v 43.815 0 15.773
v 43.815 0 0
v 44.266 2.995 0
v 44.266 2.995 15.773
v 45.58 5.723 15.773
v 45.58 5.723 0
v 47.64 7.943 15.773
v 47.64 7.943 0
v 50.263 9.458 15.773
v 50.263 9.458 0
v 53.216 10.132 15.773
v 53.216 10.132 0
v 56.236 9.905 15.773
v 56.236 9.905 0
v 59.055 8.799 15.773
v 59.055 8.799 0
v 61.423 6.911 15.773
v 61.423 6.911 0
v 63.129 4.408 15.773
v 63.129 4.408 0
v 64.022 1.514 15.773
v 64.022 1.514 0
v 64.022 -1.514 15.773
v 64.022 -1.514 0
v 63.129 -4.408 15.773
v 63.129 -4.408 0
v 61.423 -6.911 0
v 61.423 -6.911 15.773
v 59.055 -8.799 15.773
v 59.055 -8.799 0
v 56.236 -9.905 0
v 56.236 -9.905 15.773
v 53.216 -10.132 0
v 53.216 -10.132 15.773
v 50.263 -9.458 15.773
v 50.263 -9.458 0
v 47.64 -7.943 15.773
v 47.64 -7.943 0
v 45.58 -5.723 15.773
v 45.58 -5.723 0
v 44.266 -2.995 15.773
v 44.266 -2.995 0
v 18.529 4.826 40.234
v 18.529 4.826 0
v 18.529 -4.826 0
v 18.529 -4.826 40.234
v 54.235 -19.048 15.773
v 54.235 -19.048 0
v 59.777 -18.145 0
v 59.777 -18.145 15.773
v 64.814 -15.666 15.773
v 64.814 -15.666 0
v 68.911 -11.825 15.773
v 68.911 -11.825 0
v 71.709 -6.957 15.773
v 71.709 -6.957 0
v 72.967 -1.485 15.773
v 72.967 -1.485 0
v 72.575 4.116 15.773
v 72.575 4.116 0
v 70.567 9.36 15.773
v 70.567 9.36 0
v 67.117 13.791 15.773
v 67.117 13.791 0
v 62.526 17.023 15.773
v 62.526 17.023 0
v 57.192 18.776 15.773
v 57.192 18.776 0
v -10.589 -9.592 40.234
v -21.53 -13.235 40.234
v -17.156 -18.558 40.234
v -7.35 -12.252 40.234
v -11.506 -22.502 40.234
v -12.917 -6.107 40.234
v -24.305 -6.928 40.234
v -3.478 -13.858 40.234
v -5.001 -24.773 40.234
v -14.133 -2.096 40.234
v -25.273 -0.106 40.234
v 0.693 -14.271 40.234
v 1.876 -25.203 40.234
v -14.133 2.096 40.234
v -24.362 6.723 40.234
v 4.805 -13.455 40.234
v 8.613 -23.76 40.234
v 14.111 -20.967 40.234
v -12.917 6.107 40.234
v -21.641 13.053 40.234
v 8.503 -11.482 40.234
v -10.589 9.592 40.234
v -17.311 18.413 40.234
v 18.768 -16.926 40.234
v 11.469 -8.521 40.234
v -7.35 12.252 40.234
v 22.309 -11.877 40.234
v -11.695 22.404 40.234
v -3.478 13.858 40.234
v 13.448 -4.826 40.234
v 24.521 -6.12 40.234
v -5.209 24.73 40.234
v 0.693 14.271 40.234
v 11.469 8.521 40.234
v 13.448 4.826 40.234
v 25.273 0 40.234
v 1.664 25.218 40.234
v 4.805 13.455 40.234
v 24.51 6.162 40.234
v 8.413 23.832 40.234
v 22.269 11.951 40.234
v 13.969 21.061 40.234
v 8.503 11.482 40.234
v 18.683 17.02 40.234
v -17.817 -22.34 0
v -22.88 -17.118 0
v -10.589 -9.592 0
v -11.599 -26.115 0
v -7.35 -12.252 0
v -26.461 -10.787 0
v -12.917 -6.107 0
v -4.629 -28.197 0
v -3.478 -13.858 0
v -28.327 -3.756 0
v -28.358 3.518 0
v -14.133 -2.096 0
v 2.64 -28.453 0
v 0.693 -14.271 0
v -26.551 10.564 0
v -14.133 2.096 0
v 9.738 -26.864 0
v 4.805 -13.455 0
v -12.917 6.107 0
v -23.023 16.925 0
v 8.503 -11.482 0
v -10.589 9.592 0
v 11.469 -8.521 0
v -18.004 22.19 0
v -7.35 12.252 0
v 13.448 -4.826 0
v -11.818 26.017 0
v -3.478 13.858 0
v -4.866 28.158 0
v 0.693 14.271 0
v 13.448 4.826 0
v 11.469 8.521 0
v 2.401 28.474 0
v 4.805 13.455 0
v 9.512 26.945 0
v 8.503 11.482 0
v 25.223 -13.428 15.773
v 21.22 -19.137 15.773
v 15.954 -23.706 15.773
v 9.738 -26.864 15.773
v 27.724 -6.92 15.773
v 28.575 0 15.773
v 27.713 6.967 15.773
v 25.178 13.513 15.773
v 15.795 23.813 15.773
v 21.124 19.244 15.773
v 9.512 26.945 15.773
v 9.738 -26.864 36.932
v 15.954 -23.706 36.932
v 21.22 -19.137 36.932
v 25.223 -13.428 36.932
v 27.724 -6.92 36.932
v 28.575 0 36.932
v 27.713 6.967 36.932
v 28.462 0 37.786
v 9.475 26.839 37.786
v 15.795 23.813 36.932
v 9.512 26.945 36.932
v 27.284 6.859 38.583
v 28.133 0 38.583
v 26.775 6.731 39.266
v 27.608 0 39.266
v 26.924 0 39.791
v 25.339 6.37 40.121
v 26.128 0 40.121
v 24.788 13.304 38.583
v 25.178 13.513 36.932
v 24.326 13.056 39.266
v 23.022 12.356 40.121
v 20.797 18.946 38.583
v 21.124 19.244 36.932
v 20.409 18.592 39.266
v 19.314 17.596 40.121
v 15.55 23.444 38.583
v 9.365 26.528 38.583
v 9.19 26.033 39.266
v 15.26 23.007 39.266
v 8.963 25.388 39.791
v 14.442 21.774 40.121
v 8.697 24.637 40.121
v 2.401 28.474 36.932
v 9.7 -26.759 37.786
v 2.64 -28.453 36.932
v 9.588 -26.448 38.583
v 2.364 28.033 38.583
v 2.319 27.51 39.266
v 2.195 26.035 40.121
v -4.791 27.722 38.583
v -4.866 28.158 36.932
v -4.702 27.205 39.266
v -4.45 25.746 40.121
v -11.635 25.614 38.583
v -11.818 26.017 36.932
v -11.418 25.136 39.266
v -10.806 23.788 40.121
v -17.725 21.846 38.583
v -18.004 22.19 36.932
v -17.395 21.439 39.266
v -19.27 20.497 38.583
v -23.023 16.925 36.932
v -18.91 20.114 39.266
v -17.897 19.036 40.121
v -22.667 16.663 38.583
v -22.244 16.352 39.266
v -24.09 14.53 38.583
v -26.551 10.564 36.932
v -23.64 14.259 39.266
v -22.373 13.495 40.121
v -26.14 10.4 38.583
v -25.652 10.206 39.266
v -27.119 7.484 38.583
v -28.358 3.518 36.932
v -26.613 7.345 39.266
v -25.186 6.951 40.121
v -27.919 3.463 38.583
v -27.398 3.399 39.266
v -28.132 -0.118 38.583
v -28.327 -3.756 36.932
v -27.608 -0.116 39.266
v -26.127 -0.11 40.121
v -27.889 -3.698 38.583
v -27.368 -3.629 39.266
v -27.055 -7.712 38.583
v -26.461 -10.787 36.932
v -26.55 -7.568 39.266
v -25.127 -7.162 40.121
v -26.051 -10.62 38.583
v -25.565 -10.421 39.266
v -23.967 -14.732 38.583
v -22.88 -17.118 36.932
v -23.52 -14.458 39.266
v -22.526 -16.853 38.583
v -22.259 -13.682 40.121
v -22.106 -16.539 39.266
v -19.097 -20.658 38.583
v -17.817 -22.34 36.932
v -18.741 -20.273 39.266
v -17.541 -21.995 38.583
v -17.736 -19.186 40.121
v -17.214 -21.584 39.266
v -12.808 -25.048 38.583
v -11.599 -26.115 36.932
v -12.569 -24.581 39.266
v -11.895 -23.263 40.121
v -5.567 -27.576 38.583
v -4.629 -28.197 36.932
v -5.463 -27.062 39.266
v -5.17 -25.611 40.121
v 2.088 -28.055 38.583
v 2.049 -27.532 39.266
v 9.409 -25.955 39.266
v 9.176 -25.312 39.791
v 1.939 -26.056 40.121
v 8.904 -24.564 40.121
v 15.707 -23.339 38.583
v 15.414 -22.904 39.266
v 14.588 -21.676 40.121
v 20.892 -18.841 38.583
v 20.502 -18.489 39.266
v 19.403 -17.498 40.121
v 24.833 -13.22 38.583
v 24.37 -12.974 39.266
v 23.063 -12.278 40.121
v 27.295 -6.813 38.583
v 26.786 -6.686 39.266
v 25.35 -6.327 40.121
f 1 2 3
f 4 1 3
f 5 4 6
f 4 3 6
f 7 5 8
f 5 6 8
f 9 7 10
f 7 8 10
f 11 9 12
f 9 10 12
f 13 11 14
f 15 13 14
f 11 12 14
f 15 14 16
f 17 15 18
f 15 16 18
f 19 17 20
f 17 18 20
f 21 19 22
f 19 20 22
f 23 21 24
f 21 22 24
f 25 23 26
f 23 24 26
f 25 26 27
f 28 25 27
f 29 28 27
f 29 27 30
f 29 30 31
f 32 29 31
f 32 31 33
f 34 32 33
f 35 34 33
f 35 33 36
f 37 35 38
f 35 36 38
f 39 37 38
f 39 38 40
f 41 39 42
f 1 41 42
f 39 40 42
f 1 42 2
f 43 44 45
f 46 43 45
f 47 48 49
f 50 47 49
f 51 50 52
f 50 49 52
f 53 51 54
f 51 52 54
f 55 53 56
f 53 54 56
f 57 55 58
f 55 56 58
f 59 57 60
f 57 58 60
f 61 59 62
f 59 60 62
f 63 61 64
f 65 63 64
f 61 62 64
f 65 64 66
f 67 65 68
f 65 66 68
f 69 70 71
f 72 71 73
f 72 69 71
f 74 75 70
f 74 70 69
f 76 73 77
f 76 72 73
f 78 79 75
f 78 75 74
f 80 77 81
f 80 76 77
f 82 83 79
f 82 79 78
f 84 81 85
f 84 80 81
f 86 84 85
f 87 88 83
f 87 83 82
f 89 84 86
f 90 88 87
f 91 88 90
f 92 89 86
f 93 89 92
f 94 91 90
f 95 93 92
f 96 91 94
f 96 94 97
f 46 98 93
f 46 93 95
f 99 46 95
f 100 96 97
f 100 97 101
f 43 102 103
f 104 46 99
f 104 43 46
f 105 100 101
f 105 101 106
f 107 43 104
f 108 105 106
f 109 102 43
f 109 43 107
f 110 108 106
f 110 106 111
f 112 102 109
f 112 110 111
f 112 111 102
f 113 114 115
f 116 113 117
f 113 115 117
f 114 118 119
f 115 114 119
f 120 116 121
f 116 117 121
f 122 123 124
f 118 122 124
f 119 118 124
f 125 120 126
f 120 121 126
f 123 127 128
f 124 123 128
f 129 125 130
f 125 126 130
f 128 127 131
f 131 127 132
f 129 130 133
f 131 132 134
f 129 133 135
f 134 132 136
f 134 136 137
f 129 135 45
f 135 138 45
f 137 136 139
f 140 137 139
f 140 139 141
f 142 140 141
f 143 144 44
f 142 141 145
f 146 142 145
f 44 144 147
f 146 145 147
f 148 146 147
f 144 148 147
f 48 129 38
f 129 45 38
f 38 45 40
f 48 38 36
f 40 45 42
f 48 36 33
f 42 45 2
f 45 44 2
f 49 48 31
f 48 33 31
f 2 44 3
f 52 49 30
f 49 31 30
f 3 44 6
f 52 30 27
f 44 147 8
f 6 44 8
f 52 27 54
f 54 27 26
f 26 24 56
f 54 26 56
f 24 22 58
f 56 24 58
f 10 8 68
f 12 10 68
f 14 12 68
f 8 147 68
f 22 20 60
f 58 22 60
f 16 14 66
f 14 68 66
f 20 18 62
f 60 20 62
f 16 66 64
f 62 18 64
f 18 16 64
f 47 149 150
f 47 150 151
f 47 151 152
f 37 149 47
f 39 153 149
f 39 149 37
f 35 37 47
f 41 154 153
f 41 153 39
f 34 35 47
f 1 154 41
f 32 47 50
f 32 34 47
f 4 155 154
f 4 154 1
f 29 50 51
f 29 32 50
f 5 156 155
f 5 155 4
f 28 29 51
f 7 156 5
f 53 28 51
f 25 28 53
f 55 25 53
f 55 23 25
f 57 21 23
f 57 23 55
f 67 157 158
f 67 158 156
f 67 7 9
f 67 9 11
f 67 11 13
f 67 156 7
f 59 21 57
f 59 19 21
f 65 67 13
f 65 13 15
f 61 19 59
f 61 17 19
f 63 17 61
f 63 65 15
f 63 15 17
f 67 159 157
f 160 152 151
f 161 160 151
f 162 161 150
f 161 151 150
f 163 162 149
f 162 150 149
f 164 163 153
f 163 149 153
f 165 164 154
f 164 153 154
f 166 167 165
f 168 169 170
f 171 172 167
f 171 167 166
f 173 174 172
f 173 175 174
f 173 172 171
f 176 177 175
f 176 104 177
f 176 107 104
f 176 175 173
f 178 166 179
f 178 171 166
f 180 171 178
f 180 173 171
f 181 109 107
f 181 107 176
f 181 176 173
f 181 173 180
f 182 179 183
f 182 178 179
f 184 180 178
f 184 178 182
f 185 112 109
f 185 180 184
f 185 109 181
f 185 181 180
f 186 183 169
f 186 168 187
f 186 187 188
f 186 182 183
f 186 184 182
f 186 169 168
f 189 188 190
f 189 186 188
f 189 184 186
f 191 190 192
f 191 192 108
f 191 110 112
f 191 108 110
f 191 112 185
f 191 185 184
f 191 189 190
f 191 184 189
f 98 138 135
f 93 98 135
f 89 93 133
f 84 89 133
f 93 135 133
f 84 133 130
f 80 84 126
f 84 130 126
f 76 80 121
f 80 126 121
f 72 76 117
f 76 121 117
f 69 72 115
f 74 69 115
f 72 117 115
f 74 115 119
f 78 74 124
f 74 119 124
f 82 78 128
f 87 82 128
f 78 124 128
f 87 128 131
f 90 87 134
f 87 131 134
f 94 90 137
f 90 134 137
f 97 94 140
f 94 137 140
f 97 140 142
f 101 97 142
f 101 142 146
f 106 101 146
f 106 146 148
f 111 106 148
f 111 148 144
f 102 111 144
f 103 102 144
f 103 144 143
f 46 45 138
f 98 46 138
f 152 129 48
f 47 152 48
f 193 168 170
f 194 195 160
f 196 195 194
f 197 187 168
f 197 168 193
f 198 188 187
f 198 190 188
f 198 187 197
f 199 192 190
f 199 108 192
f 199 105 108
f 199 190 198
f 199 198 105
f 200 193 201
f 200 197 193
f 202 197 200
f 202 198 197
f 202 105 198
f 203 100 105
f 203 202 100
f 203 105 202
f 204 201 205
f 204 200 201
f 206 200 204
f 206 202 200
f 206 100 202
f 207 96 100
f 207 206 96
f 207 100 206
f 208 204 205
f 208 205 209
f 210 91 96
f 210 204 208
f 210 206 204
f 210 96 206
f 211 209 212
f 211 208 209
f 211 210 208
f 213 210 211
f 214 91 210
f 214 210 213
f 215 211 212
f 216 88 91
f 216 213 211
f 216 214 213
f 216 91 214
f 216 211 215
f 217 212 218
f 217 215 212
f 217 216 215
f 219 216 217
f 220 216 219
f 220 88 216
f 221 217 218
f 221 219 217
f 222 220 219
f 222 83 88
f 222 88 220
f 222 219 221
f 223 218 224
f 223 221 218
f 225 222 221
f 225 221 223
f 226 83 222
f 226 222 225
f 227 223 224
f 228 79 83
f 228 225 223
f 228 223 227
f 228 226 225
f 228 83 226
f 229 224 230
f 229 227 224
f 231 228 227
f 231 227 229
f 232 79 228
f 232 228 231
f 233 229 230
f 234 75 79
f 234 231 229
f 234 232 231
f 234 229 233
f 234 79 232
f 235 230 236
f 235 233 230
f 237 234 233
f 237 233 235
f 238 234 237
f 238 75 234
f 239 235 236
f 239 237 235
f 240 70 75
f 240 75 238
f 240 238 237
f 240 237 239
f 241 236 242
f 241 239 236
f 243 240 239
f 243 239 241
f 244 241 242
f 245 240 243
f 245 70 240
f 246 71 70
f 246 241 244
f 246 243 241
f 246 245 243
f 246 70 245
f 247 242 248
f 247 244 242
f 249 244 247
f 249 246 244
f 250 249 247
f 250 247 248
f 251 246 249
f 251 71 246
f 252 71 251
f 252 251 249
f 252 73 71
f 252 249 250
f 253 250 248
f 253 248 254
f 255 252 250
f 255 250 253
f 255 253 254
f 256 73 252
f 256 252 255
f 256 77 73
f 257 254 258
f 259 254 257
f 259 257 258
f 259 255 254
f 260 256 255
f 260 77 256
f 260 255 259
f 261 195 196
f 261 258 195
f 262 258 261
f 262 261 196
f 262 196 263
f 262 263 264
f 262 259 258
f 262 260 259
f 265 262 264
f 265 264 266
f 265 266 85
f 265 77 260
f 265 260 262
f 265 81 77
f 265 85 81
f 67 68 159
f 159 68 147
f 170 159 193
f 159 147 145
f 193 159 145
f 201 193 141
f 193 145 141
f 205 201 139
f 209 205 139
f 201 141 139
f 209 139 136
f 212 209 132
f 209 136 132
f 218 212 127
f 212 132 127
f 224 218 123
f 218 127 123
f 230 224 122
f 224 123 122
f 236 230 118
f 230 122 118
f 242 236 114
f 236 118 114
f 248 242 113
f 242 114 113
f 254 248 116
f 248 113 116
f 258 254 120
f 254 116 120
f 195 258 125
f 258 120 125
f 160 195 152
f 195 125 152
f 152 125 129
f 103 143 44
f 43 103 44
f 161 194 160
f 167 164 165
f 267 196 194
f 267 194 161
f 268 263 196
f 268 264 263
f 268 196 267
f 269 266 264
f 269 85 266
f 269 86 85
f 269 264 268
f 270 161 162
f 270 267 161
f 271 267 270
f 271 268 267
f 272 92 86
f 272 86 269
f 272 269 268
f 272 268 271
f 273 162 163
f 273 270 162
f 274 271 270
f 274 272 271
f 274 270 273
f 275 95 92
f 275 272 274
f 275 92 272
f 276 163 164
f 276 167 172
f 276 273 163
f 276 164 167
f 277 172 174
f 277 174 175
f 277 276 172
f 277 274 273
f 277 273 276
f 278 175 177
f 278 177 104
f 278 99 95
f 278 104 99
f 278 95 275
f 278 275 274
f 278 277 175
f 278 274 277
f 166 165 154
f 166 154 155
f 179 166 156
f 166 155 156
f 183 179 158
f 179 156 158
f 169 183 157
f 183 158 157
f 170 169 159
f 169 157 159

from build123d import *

# Parameters (mm, degrees)
F1_DEPTH = 40.2336
F2_DEPTH = 15.7734
F3_R     = 3.302


with BuildPart() as f1:
    # F0 (on Top) → F1 (new body)
    with BuildSketch(Plane.XY):
        with BuildLine():
            ThreePointArc((9.738373, -26.864376), (23.39663, -16.405131), (28.575, 0))
            ThreePointArc((28.575, 0), (23.327466, 16.503332), (9.512184, 26.945296))
            ThreePointArc((9.512184, 26.945296), (-28.574748, -0.120114), (9.738373, -26.864376))
        make_face()
        with BuildLine():
            Line((18.5293, 4.826), (18.5293, 0))
            Line((18.5293, 0), (18.5293, -4.826))
            Line((18.5293, -4.826), (13.447765, -4.826))
            ThreePointArc((13.447765, -4.826), (-14.2875, 0), (13.447765, 4.826))
            Line((13.447765, 4.826), (18.5293, 4.826))
        make_face(mode=Mode.SUBTRACT)
    extrude(amount=F1_DEPTH)

    # F0 (on Top) → F2 (join)
    with BuildSketch(Plane.XY):
        with BuildLine():
            ThreePointArc((9.512184, 26.945296), (23.327466, 16.503332), (28.575, 0))
            ThreePointArc((28.575, 0), (23.39663, -16.405131), (9.738373, -26.864376))
            Line((9.738373, -26.864376), (54.234754, -19.048229))
            ThreePointArc((54.234754, -19.048229), (72.967046, -1.48482), (57.191927, 18.776418))
            Line((57.191927, 18.776418), (9.512184, 26.945296))
        make_face()
        with BuildLine():
            ThreePointArc((64.135, 0), (53.975, -10.16), (43.815, 0))
            ThreePointArc((43.815, 0), (53.975, 10.16), (64.135, 0))
        make_face(mode=Mode.SUBTRACT)
    extrude(amount=F2_DEPTH)

    # F3
    f3_edges = [f1.edges().sort_by_distance(p)[0] for p in [
        (-9.738373, 26.864376, 40.2336),
    ]]
    fillet(f3_edges, radius=F3_R)


solid = f1.part
